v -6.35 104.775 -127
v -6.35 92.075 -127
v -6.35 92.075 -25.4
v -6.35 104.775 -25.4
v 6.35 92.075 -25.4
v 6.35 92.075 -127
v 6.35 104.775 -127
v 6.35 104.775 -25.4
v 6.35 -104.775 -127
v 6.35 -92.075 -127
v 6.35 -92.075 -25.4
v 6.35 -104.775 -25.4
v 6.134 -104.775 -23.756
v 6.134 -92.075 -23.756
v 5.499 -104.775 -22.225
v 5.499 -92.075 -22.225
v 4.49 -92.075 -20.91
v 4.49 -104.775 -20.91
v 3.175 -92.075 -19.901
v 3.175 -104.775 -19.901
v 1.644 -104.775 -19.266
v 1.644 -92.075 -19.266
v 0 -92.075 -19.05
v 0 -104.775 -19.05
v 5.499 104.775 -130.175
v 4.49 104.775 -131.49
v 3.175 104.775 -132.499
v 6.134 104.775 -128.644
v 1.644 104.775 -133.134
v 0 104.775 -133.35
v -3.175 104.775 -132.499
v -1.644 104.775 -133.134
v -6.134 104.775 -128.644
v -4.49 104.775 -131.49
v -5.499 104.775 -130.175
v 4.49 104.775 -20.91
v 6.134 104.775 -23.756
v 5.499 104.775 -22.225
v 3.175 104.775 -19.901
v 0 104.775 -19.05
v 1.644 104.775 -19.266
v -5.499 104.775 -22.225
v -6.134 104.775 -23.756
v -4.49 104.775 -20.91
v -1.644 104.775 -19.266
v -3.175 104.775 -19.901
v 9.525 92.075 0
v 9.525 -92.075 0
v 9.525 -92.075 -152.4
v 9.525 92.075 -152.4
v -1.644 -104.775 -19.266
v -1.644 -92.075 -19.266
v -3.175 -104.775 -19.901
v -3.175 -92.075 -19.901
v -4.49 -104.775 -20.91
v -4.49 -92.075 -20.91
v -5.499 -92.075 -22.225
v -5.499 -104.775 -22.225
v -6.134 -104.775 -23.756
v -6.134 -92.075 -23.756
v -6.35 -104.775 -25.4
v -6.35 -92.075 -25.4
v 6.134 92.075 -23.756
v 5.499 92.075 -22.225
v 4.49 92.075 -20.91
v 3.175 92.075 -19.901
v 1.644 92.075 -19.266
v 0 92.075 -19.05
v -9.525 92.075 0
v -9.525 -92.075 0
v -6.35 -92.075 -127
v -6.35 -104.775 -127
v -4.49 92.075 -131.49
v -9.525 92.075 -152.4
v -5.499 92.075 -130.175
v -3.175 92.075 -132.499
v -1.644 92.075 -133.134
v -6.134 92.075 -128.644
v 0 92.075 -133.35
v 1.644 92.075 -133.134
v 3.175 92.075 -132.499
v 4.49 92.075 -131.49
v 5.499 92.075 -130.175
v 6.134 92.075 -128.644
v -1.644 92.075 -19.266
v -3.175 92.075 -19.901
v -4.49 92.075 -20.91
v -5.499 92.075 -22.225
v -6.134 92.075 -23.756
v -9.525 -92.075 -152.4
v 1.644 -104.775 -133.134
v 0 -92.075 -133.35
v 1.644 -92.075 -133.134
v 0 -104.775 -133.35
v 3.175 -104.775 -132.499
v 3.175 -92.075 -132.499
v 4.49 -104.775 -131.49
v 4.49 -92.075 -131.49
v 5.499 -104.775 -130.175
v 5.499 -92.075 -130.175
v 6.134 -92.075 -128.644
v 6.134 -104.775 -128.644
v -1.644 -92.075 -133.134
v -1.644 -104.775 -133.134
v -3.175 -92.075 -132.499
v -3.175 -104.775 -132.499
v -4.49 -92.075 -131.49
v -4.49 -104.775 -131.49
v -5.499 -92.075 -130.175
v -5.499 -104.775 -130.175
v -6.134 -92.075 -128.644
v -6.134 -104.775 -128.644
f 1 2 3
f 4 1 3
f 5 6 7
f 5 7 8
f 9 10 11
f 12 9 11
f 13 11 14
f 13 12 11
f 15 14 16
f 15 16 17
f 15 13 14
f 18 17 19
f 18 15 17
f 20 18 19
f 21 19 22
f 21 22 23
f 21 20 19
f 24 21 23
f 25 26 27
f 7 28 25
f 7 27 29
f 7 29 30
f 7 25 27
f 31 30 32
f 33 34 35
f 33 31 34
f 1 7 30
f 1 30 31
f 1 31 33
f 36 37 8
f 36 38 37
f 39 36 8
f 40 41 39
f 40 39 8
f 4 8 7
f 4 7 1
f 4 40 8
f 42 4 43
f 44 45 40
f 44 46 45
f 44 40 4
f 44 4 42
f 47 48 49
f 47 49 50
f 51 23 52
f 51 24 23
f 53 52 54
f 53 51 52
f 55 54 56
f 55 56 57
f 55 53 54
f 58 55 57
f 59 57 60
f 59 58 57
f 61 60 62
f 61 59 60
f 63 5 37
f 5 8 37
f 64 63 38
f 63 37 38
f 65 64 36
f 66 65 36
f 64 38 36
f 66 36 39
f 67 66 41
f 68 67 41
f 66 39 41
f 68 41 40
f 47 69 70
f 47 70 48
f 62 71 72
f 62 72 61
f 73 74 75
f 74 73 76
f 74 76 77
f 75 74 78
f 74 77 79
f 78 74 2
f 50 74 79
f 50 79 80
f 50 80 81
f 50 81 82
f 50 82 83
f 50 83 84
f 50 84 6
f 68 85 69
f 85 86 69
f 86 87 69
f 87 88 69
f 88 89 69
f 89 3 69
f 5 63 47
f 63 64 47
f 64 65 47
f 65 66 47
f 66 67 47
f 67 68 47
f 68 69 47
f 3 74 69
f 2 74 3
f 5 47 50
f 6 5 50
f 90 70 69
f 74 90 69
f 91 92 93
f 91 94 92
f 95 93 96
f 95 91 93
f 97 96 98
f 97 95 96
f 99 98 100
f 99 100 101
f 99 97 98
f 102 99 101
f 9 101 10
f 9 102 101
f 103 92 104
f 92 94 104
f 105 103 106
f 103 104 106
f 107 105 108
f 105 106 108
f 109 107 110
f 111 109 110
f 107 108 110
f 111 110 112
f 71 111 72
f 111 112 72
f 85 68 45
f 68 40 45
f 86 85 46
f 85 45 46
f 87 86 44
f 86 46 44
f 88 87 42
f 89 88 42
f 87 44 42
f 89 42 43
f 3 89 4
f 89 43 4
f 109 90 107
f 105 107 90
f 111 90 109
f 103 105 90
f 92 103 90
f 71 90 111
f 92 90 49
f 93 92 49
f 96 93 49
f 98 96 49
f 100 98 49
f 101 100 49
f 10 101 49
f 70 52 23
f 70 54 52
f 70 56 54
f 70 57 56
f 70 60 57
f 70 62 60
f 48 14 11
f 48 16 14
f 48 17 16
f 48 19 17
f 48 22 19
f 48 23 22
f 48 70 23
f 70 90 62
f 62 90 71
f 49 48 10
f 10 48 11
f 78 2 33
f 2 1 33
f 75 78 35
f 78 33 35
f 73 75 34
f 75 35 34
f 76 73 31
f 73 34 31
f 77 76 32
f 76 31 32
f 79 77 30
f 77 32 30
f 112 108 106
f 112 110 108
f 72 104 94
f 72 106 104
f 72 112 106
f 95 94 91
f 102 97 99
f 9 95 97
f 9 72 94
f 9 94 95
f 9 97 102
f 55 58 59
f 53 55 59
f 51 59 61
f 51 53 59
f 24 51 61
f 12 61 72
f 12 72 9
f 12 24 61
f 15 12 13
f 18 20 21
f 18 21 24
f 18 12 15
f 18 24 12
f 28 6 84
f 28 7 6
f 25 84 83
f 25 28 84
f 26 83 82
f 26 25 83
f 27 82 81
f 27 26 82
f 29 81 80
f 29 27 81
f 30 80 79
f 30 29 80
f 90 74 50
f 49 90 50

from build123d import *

# Parameters (mm, degrees)
F0_W     = 19.05
F0_H     = 184.15
F1_DEPTH = 152.4
F2_W     = 12.7
F2_H     = 114.3
F3_DEPTH = 12.7
F4_W     = 12.7
F4_H     = 114.3
F5_DEPTH = 12.7
F6_R     = 6.34999


# Not quite as in the source:
# - a fillet or chamfer is up to 0.001 mm smaller than in the source, because OpenCascade refuses the exact size


with BuildPart() as f1:
    # F0 (on Top) → F1 (new body)
    with BuildSketch(Plane.XY):
        Rectangle(F0_W, F0_H)
    extrude(amount=-F1_DEPTH)

    # F2 (on face) → F3 (join)
    with BuildSketch(Plane.XZ.offset(92.075)):
        with Locations((0, -76.2)):
            Rectangle(F2_W, F2_H)
    extrude(amount=F3_DEPTH)

    # F4 (on face) → F5 (join)
    with BuildSketch(Plane(origin=(0, 92.075, 0), x_dir=(-1, 0, 0), z_dir=(0, 1, 0))):
        with Locations((0, -76.2)):
            Rectangle(F4_W, F4_H)
    extrude(amount=F5_DEPTH)

    # F6 (radius 6.35 in the source; OpenCascade refuses exactly that, so slightly less here)
    f6_edges = [f1.edges().sort_by_distance(p)[0] for p in [
        (6.35, 98.425, -19.05),
        (-6.35, 98.425, -19.05),
        (-6.35, 98.425, -133.35),
        (6.35, 98.425, -133.35),
        (-6.35, -98.425, -19.05),
        (6.35, -98.425, -19.05),
        (-6.35, -98.425, -133.35),
        (6.35, -98.425, -133.35),
    ]]
    fillet(f6_edges, radius=F6_R)


solid = f1.part
